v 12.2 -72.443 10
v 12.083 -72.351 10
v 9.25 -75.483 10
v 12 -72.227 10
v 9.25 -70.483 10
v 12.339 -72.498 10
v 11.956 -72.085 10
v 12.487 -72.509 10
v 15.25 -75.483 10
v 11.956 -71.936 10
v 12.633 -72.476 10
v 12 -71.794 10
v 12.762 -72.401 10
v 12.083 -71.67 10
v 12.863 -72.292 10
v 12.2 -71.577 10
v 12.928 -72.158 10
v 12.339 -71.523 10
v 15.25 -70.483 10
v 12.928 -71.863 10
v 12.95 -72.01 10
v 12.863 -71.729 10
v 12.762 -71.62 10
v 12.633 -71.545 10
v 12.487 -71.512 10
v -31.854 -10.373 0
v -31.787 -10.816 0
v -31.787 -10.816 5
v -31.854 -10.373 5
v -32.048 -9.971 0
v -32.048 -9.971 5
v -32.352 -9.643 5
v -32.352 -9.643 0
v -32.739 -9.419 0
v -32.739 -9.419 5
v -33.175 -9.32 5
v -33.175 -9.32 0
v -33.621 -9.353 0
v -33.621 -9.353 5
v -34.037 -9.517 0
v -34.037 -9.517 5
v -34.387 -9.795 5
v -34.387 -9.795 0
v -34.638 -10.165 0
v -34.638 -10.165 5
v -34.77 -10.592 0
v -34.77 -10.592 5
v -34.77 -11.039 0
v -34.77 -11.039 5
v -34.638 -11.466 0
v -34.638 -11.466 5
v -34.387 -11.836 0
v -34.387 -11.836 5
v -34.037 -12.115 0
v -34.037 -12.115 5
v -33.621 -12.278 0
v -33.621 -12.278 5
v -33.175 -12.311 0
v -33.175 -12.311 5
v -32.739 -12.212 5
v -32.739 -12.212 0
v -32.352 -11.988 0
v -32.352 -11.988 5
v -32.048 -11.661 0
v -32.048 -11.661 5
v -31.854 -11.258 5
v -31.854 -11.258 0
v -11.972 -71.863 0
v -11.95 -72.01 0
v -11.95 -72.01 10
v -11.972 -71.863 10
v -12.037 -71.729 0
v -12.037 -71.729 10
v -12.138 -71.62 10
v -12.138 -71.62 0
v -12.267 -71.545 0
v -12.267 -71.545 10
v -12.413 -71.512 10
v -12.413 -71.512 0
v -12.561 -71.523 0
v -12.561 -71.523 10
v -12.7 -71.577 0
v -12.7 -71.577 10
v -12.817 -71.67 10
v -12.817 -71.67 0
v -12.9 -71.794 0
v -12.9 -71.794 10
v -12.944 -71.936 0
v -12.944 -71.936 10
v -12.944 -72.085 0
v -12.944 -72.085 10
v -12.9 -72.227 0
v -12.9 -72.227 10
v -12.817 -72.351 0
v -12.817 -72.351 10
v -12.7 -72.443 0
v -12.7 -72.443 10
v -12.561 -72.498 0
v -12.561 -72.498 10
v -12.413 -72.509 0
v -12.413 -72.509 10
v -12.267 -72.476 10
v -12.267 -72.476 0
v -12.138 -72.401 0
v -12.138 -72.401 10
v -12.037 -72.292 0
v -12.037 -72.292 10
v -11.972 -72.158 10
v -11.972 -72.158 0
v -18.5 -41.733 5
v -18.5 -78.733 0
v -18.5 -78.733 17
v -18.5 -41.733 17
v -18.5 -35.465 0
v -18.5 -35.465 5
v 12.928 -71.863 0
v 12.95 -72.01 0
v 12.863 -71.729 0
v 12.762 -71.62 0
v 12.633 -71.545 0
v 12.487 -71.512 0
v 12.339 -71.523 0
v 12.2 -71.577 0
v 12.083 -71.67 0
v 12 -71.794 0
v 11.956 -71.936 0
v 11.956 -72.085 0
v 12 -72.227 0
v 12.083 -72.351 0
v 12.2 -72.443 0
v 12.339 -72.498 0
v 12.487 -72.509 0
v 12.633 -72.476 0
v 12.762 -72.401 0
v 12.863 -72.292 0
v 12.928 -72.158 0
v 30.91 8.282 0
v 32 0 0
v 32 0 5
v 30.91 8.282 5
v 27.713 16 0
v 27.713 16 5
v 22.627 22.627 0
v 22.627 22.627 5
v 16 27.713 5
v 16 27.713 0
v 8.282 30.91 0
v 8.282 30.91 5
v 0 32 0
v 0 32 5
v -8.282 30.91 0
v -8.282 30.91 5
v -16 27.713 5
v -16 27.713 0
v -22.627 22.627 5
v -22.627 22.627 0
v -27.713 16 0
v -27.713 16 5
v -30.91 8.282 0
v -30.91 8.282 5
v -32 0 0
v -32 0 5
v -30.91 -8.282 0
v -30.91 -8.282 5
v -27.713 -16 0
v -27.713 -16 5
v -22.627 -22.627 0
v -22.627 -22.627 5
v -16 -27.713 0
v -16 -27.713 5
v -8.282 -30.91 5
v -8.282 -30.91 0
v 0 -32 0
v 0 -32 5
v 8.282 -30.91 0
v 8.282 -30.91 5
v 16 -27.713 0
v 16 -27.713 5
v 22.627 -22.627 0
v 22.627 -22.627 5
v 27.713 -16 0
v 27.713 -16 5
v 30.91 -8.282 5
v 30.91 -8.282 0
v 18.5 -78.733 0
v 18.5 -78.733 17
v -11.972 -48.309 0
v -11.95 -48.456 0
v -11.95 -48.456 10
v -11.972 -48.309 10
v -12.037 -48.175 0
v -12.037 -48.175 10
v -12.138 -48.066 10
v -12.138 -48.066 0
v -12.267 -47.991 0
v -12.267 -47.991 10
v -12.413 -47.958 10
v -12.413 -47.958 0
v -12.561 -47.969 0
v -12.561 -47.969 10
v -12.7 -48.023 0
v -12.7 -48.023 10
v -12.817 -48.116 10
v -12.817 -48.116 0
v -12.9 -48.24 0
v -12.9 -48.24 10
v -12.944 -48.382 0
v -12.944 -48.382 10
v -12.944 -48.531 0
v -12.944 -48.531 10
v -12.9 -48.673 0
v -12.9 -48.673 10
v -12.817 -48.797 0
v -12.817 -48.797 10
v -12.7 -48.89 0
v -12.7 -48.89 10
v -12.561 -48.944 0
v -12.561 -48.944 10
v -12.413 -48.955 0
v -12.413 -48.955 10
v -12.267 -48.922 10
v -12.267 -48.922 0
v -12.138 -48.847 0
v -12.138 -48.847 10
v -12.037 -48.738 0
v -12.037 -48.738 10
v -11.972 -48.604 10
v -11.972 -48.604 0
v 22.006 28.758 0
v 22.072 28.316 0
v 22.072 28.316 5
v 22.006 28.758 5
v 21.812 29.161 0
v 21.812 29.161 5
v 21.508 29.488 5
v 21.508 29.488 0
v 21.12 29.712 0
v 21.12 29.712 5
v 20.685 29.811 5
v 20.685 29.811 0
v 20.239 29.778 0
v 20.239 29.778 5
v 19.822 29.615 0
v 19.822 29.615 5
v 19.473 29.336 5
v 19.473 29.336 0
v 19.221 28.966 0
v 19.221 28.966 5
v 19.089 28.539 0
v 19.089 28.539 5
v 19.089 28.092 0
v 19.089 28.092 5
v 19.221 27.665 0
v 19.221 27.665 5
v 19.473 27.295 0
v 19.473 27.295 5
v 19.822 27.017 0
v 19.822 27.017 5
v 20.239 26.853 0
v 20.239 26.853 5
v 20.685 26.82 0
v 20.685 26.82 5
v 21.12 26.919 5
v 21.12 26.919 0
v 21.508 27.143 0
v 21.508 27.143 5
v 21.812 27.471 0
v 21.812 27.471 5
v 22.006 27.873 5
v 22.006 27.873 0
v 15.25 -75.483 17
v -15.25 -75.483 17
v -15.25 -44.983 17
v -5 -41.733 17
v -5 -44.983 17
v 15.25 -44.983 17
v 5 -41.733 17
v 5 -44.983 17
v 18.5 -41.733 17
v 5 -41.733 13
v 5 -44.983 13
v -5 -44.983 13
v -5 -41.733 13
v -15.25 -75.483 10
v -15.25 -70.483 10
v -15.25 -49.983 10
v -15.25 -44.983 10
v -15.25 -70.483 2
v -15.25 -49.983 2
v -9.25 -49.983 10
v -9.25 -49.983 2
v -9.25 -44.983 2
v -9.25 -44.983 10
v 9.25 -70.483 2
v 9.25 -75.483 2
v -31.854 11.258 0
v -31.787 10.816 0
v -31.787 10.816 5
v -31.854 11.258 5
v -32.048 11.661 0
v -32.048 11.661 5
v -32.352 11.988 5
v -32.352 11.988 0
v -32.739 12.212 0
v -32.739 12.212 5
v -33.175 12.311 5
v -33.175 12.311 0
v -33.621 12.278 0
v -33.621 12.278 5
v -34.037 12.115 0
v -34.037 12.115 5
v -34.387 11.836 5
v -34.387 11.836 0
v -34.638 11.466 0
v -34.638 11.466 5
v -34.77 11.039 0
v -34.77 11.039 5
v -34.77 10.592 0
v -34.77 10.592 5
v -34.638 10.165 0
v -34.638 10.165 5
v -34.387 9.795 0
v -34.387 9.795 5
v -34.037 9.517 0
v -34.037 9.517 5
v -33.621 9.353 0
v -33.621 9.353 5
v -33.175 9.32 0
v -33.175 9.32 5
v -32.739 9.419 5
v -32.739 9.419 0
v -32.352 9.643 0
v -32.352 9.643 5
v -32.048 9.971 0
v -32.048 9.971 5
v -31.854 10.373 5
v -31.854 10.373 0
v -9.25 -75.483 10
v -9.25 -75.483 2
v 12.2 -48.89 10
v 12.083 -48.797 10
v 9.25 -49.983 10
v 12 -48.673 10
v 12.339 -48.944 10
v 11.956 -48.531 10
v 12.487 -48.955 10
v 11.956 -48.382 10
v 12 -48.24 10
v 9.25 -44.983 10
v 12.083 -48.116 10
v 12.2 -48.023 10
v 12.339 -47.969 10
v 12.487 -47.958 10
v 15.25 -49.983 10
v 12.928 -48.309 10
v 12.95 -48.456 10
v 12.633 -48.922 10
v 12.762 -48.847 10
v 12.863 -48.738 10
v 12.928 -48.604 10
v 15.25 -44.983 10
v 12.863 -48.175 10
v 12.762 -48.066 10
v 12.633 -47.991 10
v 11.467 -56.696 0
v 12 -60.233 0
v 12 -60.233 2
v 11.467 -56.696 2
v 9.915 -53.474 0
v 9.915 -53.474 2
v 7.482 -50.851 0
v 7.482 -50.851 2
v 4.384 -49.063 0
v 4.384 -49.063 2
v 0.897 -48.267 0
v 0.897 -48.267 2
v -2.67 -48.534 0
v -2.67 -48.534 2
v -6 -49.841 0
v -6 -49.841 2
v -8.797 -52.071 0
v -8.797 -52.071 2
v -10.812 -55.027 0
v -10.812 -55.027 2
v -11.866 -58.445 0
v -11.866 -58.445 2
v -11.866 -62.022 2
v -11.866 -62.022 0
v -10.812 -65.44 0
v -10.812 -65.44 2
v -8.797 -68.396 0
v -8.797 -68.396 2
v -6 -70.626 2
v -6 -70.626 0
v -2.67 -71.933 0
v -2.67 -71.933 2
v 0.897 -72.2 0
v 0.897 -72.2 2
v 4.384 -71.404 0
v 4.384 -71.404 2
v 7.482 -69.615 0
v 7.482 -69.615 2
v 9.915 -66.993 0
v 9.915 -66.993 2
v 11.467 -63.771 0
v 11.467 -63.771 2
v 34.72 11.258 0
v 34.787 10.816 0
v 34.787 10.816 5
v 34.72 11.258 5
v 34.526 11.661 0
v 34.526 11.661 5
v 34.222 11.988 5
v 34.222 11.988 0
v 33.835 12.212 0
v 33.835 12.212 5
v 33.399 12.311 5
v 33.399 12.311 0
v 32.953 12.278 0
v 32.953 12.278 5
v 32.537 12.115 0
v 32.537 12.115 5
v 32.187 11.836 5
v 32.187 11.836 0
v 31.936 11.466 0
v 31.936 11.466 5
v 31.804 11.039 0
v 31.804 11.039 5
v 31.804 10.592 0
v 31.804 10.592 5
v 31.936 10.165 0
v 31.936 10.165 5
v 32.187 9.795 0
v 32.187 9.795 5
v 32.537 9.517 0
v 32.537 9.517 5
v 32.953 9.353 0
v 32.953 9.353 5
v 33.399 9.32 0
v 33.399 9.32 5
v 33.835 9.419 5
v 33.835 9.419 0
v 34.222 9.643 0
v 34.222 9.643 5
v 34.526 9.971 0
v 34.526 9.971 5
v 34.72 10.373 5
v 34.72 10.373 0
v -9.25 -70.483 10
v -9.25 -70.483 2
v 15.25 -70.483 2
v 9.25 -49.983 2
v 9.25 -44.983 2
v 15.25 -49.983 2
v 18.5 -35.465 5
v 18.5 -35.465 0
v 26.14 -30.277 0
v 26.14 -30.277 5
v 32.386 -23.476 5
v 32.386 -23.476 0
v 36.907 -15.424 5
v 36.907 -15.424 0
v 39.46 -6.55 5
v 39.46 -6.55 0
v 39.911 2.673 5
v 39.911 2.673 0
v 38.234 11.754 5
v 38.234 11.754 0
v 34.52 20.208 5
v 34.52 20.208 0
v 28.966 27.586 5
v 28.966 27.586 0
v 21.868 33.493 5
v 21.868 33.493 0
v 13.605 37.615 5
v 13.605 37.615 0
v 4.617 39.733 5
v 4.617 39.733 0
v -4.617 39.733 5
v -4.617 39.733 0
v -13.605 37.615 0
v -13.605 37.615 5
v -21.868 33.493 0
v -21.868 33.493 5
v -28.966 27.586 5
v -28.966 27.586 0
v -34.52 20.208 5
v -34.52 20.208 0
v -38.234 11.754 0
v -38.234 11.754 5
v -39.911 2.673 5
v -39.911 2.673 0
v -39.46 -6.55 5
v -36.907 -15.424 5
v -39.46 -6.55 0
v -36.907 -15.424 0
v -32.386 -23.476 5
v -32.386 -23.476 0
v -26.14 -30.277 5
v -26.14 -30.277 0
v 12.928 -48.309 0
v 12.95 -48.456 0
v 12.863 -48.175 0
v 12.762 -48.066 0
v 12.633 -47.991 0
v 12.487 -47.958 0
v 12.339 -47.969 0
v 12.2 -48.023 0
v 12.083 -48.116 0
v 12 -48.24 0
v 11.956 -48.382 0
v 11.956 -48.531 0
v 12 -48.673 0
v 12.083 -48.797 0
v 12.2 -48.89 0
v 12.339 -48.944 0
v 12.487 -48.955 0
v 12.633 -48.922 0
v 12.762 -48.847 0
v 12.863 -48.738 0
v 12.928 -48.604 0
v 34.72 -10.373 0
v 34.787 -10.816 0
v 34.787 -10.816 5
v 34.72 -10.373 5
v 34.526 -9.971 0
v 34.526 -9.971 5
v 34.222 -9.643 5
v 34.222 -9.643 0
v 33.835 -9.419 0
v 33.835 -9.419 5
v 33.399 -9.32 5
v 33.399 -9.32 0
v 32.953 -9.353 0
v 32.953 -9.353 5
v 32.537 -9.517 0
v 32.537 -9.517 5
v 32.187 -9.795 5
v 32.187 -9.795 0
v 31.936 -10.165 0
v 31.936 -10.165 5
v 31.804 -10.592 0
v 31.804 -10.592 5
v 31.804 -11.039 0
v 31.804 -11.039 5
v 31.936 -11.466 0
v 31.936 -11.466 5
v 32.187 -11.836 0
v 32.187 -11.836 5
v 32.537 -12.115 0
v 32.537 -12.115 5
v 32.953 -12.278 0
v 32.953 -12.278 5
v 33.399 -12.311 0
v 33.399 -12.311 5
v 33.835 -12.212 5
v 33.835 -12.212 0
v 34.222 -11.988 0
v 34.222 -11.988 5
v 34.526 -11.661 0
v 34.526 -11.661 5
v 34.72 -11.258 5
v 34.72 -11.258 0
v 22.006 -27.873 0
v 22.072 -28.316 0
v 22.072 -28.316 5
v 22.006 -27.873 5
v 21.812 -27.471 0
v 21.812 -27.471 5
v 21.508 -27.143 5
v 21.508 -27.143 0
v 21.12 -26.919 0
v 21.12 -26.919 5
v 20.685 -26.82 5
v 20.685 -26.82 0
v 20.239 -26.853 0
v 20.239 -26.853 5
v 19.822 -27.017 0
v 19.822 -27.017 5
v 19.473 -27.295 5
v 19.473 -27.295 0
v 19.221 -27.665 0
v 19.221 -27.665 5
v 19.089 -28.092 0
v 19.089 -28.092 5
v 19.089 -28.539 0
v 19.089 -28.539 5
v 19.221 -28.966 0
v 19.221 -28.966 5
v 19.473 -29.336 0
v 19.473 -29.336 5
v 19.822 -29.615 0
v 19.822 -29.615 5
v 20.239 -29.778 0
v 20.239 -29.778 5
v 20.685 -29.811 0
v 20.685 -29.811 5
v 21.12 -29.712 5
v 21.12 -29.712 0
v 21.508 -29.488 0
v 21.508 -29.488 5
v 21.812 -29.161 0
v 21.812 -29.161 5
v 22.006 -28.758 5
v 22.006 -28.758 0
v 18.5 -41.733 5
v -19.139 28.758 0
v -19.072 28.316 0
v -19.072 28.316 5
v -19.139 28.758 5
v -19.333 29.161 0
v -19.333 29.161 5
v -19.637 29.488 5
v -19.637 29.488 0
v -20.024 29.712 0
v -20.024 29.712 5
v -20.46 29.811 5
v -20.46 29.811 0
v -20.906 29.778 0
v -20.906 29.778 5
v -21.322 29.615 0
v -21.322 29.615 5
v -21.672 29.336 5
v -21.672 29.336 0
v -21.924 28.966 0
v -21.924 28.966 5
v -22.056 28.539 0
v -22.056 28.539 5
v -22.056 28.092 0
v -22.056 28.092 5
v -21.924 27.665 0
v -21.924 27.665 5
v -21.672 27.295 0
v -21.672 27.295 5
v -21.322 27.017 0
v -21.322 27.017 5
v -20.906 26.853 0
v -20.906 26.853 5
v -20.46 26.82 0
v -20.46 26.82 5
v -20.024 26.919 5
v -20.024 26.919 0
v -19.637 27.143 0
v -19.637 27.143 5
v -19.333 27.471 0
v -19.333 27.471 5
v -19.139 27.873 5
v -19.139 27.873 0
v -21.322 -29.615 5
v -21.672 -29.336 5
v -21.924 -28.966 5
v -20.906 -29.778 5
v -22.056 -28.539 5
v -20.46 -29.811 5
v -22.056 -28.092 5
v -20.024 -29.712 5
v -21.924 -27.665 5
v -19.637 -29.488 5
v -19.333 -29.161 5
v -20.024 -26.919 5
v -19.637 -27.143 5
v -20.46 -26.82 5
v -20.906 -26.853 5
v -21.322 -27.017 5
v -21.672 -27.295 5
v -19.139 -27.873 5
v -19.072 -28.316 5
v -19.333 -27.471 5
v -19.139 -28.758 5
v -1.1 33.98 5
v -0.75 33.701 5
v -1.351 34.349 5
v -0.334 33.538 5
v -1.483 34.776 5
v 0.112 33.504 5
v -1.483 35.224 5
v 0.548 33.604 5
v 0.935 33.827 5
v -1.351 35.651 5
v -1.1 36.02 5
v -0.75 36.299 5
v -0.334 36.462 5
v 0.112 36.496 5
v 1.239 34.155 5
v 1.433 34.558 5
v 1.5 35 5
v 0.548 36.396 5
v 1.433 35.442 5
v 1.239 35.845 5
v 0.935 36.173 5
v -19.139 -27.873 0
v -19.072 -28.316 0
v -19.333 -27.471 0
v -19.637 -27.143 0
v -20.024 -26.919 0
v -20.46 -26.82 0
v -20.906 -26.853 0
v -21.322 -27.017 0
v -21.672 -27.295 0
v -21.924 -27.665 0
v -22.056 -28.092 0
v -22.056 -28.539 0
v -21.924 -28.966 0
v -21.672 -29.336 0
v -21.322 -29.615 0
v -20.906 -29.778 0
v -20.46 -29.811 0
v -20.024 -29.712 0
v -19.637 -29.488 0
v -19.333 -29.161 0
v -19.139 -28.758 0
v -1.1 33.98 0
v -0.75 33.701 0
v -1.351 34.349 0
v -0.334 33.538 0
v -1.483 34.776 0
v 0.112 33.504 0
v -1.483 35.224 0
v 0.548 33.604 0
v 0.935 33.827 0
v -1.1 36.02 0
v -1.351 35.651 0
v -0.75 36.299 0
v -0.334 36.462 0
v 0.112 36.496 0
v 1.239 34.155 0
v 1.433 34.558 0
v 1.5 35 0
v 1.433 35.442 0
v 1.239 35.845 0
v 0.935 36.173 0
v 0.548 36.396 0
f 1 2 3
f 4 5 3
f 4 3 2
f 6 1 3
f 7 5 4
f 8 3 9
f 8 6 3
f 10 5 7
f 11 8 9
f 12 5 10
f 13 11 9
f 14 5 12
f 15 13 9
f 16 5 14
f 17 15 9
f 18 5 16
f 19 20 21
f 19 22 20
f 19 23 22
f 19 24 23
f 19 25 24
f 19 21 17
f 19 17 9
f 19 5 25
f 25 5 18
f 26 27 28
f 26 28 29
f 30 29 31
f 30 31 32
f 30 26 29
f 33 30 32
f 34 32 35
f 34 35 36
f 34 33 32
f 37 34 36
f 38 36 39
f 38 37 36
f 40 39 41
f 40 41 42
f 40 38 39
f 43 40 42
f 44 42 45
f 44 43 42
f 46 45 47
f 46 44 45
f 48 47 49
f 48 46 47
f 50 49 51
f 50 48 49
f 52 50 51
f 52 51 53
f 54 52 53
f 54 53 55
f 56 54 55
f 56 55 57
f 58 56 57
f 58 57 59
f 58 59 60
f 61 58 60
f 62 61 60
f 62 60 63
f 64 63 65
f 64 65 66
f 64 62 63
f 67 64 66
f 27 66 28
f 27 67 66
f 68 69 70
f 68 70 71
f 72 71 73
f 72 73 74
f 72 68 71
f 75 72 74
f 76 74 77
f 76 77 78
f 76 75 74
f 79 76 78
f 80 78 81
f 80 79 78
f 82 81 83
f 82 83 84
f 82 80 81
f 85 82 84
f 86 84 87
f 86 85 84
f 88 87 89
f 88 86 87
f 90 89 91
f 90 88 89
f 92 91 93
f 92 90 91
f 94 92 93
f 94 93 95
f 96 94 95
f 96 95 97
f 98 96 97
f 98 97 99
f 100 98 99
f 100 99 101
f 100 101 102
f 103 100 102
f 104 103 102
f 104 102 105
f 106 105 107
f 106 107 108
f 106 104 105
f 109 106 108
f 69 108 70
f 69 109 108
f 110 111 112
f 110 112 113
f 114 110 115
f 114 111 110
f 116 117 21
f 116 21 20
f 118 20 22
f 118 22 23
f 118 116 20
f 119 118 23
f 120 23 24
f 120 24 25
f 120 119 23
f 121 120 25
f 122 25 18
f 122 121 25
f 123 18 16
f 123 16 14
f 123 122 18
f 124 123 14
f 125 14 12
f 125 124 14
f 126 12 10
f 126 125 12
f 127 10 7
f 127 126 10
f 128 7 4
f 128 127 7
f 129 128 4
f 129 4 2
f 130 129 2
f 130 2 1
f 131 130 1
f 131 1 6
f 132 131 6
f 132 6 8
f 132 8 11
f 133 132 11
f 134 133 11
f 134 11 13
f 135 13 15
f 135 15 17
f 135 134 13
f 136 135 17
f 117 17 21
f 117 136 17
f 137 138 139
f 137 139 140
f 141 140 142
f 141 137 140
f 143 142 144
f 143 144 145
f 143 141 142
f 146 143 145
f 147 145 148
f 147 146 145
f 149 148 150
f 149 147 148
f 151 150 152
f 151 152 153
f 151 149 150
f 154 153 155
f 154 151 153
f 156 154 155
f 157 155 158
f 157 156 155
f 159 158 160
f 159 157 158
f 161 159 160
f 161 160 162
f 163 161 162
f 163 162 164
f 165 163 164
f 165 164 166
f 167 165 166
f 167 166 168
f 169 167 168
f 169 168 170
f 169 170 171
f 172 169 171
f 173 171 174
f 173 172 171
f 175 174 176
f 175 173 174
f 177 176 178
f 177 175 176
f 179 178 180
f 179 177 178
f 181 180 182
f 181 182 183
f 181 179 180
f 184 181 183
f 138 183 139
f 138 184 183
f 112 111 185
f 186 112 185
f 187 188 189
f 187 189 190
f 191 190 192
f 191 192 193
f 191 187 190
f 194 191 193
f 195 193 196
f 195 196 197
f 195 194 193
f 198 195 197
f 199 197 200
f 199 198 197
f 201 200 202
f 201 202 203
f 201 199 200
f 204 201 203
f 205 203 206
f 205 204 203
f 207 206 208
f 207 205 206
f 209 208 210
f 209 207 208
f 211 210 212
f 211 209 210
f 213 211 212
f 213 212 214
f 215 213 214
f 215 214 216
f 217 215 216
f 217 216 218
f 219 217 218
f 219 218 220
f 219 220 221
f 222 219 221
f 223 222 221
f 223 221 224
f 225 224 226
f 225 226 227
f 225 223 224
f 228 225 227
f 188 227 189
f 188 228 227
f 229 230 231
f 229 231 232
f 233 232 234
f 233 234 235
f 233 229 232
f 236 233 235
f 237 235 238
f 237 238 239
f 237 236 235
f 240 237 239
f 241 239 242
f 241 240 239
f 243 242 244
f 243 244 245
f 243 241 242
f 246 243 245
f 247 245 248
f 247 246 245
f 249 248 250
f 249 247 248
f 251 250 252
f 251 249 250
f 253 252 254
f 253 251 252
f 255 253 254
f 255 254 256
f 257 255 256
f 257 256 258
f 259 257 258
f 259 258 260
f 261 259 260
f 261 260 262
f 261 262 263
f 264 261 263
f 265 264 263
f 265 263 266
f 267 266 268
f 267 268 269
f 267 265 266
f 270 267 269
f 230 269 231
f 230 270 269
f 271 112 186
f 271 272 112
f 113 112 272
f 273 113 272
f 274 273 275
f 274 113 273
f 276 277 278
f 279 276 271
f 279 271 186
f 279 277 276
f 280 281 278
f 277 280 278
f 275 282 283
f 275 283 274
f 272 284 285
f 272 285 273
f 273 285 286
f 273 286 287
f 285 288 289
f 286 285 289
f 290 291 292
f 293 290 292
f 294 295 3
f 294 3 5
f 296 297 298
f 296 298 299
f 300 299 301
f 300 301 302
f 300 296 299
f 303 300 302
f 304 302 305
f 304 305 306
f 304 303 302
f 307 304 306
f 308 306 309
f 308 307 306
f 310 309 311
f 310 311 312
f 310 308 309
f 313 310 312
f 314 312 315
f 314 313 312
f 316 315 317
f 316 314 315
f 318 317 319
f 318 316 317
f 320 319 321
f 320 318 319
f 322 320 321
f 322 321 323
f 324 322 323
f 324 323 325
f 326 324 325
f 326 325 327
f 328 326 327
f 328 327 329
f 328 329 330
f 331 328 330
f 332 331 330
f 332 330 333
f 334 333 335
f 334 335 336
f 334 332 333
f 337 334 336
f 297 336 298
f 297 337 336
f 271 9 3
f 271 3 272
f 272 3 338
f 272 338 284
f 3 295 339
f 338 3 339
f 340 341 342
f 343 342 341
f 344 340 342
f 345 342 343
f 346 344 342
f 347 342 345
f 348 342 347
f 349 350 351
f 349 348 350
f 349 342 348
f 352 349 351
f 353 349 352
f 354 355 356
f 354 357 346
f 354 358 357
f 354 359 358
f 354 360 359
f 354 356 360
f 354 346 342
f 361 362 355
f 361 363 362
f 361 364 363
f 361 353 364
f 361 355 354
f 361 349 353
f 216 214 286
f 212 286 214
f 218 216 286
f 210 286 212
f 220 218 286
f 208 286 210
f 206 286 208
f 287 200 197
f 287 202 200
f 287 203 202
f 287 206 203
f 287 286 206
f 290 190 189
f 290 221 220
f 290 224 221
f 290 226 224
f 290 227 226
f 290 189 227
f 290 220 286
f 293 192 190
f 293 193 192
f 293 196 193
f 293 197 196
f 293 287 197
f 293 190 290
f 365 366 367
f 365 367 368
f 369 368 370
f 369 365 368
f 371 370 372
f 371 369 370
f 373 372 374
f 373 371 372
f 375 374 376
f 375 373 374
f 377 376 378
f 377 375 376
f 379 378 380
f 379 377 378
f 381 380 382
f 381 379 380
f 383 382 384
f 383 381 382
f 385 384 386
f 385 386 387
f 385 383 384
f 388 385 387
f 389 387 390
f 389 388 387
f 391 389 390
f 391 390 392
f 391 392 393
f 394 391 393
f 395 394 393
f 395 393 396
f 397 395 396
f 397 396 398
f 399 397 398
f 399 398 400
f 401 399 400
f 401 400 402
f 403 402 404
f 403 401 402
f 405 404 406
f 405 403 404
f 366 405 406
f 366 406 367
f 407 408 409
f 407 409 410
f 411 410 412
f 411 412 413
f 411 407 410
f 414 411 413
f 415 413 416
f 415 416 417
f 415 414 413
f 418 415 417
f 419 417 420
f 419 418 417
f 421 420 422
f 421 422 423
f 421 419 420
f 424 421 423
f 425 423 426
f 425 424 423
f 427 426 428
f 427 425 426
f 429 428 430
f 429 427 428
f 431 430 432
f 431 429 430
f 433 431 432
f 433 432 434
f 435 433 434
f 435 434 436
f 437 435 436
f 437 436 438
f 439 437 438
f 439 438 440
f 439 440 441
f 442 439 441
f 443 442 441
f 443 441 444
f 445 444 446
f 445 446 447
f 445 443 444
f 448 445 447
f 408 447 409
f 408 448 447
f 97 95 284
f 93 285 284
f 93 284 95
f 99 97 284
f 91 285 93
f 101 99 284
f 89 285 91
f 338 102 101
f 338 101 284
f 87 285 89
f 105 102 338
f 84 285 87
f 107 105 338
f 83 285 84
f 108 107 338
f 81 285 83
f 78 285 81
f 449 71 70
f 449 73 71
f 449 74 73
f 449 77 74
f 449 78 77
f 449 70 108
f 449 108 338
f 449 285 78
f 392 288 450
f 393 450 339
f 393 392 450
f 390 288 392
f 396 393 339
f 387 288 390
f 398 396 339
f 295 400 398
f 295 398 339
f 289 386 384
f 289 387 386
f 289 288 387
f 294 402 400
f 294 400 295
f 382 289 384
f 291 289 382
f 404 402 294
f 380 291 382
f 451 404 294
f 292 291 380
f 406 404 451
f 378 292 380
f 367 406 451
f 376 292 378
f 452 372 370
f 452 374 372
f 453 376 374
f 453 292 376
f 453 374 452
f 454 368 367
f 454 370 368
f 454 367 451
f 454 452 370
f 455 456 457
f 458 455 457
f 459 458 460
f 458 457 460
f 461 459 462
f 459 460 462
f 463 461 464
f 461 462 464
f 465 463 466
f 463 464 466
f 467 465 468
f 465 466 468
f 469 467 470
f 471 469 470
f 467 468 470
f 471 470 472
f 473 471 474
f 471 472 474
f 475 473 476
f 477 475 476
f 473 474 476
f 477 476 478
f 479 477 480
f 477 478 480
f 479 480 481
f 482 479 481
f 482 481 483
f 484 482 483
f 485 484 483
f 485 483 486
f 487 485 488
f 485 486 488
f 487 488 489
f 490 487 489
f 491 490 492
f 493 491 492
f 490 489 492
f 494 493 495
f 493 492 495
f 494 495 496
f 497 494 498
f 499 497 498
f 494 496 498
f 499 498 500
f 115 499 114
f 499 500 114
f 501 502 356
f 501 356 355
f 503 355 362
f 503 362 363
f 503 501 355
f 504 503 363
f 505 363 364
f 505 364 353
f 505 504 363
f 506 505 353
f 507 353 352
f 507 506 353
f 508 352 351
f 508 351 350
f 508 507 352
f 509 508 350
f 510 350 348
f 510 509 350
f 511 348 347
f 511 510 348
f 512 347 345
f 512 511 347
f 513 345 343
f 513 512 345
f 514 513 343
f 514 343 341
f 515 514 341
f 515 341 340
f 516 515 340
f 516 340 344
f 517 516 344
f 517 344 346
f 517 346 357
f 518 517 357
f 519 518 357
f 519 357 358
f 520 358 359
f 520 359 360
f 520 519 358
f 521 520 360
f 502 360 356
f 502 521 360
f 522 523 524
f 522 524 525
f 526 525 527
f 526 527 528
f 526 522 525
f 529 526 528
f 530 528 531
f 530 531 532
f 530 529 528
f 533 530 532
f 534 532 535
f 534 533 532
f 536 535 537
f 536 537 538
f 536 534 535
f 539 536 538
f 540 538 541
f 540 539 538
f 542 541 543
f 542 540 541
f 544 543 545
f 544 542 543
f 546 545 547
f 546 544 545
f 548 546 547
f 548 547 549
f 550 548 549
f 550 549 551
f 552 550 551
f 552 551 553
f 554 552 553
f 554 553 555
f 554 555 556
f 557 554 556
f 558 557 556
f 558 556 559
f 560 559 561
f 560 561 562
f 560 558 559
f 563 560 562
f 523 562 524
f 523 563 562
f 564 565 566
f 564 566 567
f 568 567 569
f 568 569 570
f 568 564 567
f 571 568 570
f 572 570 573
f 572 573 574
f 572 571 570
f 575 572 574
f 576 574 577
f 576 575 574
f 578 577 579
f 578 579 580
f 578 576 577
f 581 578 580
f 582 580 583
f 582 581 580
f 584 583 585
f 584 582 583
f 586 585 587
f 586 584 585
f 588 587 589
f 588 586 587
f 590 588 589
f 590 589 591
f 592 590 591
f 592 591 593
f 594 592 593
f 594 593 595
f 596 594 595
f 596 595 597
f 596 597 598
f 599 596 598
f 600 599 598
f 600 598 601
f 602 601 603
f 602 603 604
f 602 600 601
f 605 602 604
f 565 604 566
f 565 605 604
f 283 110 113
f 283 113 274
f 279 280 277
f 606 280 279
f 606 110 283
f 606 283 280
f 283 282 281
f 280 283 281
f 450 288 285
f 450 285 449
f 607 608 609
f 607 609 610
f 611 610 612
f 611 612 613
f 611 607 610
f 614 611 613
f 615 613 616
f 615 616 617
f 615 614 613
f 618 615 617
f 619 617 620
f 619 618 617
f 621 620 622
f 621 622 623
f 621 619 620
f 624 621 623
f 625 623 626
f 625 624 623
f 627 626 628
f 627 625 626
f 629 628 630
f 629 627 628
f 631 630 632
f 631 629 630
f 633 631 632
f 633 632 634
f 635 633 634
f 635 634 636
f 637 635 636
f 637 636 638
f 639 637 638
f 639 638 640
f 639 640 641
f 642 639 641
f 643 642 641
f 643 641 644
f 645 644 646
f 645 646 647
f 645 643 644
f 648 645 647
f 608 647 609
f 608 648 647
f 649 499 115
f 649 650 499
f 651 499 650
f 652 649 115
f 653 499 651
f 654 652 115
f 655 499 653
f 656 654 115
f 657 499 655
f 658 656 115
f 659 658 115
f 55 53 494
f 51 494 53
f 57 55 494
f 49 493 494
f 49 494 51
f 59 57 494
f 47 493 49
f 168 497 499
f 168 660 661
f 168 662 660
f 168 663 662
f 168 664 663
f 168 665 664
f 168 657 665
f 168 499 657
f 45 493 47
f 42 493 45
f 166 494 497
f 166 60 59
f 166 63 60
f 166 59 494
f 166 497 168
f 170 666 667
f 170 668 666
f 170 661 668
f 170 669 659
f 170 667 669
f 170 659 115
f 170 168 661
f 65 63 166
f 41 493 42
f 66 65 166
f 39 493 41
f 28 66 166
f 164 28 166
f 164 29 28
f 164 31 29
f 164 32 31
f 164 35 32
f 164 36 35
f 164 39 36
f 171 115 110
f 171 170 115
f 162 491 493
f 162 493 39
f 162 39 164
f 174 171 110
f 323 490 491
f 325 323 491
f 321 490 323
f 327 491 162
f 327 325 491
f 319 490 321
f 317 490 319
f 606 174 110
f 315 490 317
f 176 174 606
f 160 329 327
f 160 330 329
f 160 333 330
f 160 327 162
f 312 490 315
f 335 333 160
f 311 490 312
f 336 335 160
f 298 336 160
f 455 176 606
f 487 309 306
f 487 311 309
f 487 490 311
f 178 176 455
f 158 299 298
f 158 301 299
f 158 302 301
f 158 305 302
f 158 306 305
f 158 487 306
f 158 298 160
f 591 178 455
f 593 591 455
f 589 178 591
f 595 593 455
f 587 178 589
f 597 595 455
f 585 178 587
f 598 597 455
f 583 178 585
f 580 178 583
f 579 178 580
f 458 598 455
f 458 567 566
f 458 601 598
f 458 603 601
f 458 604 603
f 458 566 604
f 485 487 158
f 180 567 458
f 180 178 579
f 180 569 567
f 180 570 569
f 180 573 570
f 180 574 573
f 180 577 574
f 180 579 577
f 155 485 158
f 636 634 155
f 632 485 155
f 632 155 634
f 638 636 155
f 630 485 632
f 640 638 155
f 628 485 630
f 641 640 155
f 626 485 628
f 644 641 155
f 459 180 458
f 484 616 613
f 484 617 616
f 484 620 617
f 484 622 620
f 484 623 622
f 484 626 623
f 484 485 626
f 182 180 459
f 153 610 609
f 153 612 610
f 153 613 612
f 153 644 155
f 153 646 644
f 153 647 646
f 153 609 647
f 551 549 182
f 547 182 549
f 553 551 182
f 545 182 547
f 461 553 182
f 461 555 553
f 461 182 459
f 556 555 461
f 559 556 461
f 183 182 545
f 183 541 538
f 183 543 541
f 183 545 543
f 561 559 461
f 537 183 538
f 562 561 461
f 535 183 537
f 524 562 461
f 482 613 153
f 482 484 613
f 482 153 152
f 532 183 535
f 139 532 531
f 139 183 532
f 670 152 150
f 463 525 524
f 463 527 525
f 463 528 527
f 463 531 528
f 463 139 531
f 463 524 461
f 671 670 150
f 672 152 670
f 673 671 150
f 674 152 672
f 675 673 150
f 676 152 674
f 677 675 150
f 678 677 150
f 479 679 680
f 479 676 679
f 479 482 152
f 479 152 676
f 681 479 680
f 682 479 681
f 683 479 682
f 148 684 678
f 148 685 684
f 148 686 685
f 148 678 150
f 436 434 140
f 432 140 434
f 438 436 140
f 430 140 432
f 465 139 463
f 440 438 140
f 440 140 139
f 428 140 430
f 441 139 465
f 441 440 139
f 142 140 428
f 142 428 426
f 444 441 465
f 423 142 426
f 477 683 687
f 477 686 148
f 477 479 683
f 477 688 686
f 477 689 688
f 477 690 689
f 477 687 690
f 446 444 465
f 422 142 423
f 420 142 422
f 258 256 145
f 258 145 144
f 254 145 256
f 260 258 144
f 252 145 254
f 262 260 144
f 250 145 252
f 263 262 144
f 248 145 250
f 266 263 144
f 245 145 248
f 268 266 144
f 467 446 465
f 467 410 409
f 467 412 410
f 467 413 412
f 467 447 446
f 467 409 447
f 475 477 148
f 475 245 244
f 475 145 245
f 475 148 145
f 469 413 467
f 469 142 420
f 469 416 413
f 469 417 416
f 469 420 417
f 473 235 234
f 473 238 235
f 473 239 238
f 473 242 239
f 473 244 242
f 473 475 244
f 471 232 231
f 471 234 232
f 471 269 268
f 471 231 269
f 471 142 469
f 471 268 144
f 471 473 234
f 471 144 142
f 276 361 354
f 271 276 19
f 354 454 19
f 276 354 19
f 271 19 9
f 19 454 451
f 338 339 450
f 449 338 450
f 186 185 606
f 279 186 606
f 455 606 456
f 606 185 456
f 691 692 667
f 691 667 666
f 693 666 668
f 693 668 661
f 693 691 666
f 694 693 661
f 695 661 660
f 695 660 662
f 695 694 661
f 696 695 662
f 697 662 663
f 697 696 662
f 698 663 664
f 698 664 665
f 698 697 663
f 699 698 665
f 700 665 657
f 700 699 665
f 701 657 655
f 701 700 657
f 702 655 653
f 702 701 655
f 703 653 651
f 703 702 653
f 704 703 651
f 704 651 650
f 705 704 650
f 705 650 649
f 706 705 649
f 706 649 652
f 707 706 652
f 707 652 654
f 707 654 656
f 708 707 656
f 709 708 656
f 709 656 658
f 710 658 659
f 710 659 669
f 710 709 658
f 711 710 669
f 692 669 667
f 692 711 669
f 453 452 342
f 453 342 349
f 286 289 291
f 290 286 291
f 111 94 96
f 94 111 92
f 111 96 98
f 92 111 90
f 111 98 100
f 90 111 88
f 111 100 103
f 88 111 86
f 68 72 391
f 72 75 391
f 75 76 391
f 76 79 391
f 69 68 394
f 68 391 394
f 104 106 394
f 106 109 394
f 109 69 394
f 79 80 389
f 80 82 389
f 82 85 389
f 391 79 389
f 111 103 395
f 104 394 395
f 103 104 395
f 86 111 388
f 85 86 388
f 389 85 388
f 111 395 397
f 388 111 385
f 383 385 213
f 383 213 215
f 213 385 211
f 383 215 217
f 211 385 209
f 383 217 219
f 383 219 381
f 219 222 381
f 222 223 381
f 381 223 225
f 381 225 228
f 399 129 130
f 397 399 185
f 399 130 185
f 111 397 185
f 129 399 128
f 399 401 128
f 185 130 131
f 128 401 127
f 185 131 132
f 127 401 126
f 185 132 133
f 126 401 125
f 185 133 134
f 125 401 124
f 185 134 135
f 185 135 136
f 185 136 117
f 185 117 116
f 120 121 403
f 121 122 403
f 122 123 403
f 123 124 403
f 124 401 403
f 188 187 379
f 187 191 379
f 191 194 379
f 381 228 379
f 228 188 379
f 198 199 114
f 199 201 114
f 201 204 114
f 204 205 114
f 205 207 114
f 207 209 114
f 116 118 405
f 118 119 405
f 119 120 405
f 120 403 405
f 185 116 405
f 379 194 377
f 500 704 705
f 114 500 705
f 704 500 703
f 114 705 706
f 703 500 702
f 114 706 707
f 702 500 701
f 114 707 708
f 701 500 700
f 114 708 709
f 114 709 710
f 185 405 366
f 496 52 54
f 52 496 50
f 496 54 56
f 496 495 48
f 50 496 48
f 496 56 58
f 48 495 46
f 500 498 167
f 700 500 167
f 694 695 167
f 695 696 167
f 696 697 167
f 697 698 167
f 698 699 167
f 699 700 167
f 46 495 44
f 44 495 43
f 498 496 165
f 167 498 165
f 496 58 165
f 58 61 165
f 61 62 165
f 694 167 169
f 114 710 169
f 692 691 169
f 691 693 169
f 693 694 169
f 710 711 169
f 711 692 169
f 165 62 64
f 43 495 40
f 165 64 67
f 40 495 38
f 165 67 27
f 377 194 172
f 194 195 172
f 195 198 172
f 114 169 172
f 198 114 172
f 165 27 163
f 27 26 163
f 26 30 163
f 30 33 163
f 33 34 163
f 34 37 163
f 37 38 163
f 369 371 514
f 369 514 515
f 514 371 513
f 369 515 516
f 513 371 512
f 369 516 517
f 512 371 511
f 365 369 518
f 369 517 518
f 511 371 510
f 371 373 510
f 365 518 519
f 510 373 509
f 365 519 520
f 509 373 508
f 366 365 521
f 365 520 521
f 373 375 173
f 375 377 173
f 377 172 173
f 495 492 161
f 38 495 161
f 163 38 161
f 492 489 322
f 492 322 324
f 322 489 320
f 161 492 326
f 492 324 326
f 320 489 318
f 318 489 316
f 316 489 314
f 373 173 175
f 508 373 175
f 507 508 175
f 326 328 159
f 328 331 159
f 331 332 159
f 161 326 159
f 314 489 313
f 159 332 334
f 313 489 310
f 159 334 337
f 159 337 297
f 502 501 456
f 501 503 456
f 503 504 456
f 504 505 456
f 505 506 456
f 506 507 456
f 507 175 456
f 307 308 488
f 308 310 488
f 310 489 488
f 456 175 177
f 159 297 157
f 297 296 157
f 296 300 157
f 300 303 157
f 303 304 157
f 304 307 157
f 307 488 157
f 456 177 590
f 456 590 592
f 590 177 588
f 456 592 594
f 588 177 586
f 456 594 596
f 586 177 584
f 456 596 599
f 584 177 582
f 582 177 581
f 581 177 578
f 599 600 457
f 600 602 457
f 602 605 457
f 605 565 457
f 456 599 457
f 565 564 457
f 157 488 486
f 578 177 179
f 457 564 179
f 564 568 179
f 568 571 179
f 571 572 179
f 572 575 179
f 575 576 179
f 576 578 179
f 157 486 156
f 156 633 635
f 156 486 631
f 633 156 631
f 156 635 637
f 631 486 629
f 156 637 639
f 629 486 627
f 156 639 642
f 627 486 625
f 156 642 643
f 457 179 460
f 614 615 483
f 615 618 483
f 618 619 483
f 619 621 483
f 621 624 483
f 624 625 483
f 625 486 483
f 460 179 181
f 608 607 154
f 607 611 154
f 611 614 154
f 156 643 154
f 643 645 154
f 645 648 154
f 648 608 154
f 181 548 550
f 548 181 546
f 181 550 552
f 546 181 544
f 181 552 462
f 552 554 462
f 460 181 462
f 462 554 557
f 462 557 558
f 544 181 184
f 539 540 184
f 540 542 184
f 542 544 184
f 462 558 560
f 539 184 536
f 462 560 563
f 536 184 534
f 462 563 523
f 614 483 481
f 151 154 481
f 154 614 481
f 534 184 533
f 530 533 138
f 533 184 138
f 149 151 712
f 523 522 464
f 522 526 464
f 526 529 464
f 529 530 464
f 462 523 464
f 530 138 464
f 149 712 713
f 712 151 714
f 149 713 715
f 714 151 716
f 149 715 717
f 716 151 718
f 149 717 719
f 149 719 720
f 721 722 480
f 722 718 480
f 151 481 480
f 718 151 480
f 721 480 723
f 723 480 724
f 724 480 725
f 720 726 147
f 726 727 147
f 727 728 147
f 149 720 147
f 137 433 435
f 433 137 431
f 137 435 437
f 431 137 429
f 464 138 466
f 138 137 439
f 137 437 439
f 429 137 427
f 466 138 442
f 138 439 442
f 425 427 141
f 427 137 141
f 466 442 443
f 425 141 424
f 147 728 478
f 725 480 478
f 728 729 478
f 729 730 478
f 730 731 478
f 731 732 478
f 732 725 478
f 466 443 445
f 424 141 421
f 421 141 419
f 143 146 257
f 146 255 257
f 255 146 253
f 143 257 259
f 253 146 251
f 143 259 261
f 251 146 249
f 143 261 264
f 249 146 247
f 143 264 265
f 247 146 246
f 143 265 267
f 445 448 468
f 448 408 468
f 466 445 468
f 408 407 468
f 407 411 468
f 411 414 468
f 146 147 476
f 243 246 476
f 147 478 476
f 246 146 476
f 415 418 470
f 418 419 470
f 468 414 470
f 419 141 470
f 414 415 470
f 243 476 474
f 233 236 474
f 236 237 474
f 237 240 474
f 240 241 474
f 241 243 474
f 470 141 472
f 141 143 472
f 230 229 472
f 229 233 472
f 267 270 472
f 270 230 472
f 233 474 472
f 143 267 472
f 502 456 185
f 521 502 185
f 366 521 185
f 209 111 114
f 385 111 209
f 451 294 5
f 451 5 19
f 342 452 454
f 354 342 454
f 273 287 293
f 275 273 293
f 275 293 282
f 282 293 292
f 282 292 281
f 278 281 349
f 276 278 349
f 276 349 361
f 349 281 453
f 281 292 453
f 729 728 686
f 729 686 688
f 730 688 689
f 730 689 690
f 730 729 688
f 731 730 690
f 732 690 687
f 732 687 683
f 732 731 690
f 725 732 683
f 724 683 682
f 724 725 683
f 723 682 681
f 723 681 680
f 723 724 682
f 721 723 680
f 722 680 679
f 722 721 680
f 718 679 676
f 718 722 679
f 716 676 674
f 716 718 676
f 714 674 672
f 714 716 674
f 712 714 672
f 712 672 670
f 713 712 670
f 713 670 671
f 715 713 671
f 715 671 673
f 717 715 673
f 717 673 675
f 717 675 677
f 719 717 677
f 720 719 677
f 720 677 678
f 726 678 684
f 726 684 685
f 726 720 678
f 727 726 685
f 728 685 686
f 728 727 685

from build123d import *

# Parameters (mm, degrees)
SKETCH1_R           = 1.5
SKETCH1_R_2         = 32
BOSS_EXTRUDE1_DEPTH = 5
SKETCH1_31_R        = 12
BOSS_EXTRUDE2_DEPTH = 2
SKETCH1_32_W        = 6
SKETCH1_32_H        = 5
SKETCH1_32_R        = 0.5
BOSS_EXTRUDE3_DEPTH = 10
SKETCH1_33_W        = 37
SKETCH1_33_H        = 37
BOSS_EXTRUDE4_DEPTH = 17
SKETCH2_W           = 10
SKETCH2_H           = 4
CUT_EXTRUDE1_DEPTH  = 3.25


with BuildPart() as part:
    # Sketch1 → Boss-Extrude1 (new body)
    with BuildSketch(Plane.XY):
        with BuildLine():
            Line((-18.5, -41.733467654), (18.5, -41.733467654))
            Line((18.5, -41.733467654), (18.5, -35.464771253))
            ThreePointArc((18.5, -35.464771253), (0, 40), (-18.5, -35.464771253))
            Line((-18.5, -35.464771253), (-18.5, -41.733467654))
        make_face()
        with Locations((-20.57248383, -28.315594803)):
            Circle(SKETCH1_R, mode=Mode.SUBTRACT)
        with Locations((20.57248383, -28.315594803)):
            Circle(SKETCH1_R, mode=Mode.SUBTRACT)
        with Locations((-33.28697807, -10.815594803)):
            Circle(SKETCH1_R, mode=Mode.SUBTRACT)
        with Locations((-33.28697807, 10.815594803)):
            Circle(SKETCH1_R, mode=Mode.SUBTRACT)
        with Locations((-20.57248383, 28.315594803)):
            Circle(SKETCH1_R, mode=Mode.SUBTRACT)
        Circle(SKETCH1_R_2, mode=Mode.SUBTRACT)
        with Locations((33.28697807, -10.815594803)):
            Circle(SKETCH1_R, mode=Mode.SUBTRACT)
        with Locations((0, 35)):
            Circle(SKETCH1_R, mode=Mode.SUBTRACT)
        with Locations((33.28697807, 10.815594803)):
            Circle(SKETCH1_R, mode=Mode.SUBTRACT)
        with Locations((20.57248383, 28.315594803)):
            Circle(SKETCH1_R, mode=Mode.SUBTRACT)
    extrude(amount=BOSS_EXTRUDE1_DEPTH)



with BuildPart() as body_2:
    # Sketch1<31> → Boss-Extrude2 (new body)
    with BuildSketch(Plane.XY):
        Polygon((9.25, -49.983467654), (9.25, -44.983467654), (-9.25, -44.983467654), (-9.25, -49.983467654), (-15.25, -49.983467654), (-15.25, -70.483467654), (-9.25, -70.483467654), (-9.25, -75.483467654), (9.25, -75.483467654), (9.25, -70.483467654), (15.25, -70.483467654), (15.25, -49.983467654), align=None)
        with Locations((0, -60.233467654)):
            Circle(SKETCH1_31_R, mode=Mode.SUBTRACT)
    extrude(amount=BOSS_EXTRUDE2_DEPTH)

    # Sketch1<32> → Boss-Extrude3 (add)
    # profile 1 of 4: a face of its own
    with BuildSketch(Plane.XY):
        with Locations((-12.25, -47.483467654)):
            Rectangle(SKETCH1_32_W, SKETCH1_32_H)
        with Locations((-12.45, -48.456490694)):
            Circle(SKETCH1_32_R, mode=Mode.SUBTRACT)
    # profile 2 of 4: a face of its own
    with BuildSketch(Plane.XY):
        with Locations((12.25, -47.483467654)):
            Rectangle(SKETCH1_32_W, SKETCH1_32_H)
        with Locations((12.45, -48.456490694)):
            Circle(SKETCH1_32_R, mode=Mode.SUBTRACT)
    # profile 3 of 4: a face of its own
    with BuildSketch(Plane.XY):
        with Locations((12.25, -72.983467654)):
            Rectangle(SKETCH1_32_W, SKETCH1_32_H)
        with Locations((12.45, -72.010444613)):
            Circle(SKETCH1_32_R, mode=Mode.SUBTRACT)
    # profile 4 of 4: a face of its own
    with BuildSketch(Plane.XY):
        with Locations((-12.25, -72.983467654)):
            Rectangle(SKETCH1_32_W, SKETCH1_32_H)
        with Locations((-12.45, -72.010444613)):
            Circle(SKETCH1_32_R, mode=Mode.SUBTRACT)
    extrude(amount=BOSS_EXTRUDE3_DEPTH)


with BuildPart() as part_1:
    add(part.part)

    add(body_2.part)  # Boss-Extrude4 merges body 2
    # Sketch1<33> → Boss-Extrude4 (add)
    with BuildSketch(Plane.XY):
        with Locations((0, -60.233467654)):
            Rectangle(SKETCH1_33_W, SKETCH1_33_H)
        Polygon((9.25, -44.983467654), (15.25, -44.983467654), (15.25, -49.983467654), (15.25, -70.483467654), (15.25, -75.483467654), (9.25, -75.483467654), (-9.25, -75.483467654), (-15.25, -75.483467654), (-15.25, -70.483467654), (-15.25, -49.983467654), (-15.25, -44.983467654), (-9.25, -44.983467654), align=None, mode=Mode.SUBTRACT)
    extrude(amount=BOSS_EXTRUDE4_DEPTH)

    # Sketch2 → Cut-Extrude1 (cut)
    with BuildSketch(Plane.XZ.offset(44.983467654)):
        with Locations((0, 15)):
            Rectangle(SKETCH2_W, SKETCH2_H)
    extrude(amount=-CUT_EXTRUDE1_DEPTH, mode=Mode.SUBTRACT)


solid = part_1.part
